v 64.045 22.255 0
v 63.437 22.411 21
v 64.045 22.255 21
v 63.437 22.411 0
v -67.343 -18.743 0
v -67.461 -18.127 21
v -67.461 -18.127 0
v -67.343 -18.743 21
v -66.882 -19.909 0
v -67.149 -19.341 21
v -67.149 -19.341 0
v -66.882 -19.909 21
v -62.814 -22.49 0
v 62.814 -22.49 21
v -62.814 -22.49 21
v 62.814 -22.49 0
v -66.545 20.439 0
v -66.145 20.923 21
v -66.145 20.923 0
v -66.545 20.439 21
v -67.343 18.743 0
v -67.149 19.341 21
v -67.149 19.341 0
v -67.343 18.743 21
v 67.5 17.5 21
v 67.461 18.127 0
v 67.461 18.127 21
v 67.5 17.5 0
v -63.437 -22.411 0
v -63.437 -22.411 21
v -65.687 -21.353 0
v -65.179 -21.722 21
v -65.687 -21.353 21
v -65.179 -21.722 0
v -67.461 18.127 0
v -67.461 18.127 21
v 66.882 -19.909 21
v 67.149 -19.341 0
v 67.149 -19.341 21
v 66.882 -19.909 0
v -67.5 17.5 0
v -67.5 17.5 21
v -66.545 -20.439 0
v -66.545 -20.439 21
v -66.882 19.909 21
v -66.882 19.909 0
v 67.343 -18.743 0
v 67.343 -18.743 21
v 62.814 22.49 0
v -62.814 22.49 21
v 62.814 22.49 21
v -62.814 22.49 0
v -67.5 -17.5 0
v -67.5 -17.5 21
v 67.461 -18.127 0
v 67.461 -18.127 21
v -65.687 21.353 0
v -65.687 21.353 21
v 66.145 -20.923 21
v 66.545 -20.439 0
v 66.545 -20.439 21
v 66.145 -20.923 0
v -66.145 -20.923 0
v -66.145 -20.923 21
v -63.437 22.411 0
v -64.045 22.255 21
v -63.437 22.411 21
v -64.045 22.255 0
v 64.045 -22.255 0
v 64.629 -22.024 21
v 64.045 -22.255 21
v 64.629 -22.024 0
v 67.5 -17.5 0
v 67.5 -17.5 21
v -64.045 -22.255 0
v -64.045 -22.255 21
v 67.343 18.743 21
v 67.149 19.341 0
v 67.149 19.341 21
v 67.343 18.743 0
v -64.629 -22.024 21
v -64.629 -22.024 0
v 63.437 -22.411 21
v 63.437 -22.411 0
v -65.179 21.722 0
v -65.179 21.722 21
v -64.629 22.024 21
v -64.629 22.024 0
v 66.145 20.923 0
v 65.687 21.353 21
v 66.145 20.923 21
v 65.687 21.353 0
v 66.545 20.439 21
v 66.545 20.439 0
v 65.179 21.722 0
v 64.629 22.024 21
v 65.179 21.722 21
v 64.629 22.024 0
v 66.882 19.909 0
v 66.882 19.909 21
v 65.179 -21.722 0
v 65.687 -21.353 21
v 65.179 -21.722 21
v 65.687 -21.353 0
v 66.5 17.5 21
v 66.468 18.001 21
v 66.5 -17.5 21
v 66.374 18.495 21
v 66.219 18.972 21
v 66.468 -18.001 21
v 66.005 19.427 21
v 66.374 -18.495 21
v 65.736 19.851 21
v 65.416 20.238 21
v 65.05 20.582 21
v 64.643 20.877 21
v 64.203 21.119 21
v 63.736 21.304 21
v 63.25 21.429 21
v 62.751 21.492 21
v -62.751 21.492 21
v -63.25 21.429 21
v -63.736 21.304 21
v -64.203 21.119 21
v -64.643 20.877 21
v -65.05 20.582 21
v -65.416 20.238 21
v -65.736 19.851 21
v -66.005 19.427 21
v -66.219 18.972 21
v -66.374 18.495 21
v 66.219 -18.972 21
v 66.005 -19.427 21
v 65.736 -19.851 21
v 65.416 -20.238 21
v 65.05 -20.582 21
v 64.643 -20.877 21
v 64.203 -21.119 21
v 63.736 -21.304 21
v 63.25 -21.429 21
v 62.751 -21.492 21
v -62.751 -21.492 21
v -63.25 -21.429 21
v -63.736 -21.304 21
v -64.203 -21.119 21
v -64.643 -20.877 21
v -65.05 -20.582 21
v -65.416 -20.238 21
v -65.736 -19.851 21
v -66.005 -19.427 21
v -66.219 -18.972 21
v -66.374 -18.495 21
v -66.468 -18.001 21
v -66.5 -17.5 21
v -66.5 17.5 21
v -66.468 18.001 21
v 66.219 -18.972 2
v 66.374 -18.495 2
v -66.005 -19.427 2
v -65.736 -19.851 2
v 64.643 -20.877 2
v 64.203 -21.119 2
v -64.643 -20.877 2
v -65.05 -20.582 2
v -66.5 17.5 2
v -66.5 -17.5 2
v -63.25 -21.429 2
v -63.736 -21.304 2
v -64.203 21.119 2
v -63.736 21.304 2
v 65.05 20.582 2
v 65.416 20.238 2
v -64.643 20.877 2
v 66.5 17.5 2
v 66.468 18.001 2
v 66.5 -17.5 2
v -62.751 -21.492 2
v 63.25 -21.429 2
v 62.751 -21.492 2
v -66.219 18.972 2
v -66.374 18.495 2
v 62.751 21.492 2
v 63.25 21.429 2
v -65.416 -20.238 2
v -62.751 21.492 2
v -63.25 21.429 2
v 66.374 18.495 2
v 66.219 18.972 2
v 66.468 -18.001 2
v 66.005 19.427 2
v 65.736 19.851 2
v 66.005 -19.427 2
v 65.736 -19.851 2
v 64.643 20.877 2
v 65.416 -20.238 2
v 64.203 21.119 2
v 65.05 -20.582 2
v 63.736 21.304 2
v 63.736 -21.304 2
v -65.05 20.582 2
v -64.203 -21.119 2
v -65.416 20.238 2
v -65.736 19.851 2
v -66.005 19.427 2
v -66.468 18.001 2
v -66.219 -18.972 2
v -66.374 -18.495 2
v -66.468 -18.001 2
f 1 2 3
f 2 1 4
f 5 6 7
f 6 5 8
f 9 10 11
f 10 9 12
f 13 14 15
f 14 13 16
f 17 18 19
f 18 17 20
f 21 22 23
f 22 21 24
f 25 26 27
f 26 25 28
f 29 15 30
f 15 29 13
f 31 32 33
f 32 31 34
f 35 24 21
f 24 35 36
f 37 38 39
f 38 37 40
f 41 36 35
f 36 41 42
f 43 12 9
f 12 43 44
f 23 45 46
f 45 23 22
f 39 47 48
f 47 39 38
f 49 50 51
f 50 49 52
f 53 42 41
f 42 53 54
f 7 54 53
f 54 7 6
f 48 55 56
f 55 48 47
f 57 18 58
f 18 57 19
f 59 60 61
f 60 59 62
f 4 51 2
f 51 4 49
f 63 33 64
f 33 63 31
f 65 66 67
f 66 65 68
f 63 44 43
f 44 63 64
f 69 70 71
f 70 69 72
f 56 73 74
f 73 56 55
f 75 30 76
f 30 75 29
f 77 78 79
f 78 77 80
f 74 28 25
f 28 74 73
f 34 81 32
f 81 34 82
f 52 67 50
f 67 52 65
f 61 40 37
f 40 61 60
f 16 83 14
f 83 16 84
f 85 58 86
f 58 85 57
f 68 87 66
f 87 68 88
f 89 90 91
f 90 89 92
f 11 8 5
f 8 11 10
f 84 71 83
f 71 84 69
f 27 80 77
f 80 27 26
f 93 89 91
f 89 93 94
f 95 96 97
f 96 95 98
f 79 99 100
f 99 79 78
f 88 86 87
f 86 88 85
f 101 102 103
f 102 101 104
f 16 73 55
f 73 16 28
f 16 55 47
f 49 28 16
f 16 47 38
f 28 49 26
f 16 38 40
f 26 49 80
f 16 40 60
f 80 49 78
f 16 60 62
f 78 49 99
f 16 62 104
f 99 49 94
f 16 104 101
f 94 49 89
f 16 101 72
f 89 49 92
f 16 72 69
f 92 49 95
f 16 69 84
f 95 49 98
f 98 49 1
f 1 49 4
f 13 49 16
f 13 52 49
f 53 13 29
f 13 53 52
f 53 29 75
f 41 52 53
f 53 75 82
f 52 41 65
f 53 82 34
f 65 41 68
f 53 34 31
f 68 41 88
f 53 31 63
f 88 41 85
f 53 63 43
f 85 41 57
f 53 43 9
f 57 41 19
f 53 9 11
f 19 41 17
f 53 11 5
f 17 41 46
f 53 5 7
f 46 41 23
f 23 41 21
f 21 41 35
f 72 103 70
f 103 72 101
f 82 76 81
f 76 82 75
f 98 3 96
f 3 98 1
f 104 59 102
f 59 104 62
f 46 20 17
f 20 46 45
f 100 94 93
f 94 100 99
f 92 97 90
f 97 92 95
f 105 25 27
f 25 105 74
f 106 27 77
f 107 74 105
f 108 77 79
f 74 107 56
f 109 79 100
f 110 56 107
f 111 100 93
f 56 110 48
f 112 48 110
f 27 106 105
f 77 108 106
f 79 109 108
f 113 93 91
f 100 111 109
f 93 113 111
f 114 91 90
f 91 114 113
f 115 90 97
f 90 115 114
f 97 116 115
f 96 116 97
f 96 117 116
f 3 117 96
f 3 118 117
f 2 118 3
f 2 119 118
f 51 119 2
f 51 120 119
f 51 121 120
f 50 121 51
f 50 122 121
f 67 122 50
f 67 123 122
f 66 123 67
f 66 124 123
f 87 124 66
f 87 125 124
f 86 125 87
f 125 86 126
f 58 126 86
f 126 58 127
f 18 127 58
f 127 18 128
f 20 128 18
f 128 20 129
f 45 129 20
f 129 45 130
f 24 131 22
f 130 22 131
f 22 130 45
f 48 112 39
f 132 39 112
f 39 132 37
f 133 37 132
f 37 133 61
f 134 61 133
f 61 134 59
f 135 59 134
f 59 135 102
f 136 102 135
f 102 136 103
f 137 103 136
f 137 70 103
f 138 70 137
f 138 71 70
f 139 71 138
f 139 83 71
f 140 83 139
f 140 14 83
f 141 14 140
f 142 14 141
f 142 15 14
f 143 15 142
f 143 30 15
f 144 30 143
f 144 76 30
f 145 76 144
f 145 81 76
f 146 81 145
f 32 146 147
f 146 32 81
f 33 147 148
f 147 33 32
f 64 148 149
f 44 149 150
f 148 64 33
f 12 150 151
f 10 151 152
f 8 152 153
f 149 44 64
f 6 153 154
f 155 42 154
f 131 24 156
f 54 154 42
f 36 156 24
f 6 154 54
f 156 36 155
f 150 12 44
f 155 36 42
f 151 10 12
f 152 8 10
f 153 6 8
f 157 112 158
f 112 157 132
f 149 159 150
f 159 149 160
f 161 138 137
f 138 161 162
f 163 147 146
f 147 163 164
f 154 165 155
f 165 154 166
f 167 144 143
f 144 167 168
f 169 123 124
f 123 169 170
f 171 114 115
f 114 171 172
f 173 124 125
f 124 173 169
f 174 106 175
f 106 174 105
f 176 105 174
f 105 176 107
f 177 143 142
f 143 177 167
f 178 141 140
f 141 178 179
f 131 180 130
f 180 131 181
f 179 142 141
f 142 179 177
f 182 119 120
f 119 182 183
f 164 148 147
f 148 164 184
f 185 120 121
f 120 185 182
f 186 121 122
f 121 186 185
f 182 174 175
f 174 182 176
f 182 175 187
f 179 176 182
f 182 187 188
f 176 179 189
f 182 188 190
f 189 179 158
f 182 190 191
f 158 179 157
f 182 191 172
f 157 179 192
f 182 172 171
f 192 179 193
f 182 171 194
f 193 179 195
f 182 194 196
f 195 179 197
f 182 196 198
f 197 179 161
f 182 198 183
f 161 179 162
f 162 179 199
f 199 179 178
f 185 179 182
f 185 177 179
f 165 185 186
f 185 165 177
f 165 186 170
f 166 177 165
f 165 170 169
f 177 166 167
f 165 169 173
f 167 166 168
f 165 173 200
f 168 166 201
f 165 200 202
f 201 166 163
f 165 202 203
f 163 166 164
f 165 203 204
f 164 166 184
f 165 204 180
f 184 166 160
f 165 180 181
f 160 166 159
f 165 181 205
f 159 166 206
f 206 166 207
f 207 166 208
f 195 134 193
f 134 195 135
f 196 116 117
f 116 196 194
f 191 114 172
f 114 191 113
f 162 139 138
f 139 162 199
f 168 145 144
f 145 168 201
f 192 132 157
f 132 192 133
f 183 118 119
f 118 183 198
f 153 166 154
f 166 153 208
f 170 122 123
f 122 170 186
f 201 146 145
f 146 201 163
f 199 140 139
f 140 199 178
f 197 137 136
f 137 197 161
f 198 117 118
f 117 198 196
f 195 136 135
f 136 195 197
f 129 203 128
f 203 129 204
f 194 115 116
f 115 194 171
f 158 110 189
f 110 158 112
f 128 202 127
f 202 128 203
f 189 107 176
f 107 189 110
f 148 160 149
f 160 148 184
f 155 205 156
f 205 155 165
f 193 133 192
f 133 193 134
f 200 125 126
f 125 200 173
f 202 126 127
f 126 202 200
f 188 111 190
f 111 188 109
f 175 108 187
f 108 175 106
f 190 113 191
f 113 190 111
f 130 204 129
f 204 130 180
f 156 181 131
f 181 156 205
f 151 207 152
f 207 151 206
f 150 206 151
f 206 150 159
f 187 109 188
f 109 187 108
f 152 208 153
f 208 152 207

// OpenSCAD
$fn = 50;


difference() {
	union() {
		hull() {
			translate(v = [-62.5000000000, 17.5000000000, 0]) {
				cylinder(h = 21, r = 5);
			}
			translate(v = [62.5000000000, 17.5000000000, 0]) {
				cylinder(h = 21, r = 5);
			}
			translate(v = [-62.5000000000, -17.5000000000, 0]) {
				cylinder(h = 21, r = 5);
			}
			translate(v = [62.5000000000, -17.5000000000, 0]) {
				cylinder(h = 21, r = 5);
			}
		}
	}
	union() {
		translate(v = [0, 0, 2]) {
			hull() {
				translate(v = [-62.5000000000, 17.5000000000, 0]) {
					cylinder(h = 19, r = 4);
				}
				translate(v = [62.5000000000, 17.5000000000, 0]) {
					cylinder(h = 19, r = 4);
				}
				translate(v = [-62.5000000000, -17.5000000000, 0]) {
					cylinder(h = 19, r = 4);
				}
				translate(v = [62.5000000000, -17.5000000000, 0]) {
					cylinder(h = 19, r = 4);
				}
			}
		}
	}
}
